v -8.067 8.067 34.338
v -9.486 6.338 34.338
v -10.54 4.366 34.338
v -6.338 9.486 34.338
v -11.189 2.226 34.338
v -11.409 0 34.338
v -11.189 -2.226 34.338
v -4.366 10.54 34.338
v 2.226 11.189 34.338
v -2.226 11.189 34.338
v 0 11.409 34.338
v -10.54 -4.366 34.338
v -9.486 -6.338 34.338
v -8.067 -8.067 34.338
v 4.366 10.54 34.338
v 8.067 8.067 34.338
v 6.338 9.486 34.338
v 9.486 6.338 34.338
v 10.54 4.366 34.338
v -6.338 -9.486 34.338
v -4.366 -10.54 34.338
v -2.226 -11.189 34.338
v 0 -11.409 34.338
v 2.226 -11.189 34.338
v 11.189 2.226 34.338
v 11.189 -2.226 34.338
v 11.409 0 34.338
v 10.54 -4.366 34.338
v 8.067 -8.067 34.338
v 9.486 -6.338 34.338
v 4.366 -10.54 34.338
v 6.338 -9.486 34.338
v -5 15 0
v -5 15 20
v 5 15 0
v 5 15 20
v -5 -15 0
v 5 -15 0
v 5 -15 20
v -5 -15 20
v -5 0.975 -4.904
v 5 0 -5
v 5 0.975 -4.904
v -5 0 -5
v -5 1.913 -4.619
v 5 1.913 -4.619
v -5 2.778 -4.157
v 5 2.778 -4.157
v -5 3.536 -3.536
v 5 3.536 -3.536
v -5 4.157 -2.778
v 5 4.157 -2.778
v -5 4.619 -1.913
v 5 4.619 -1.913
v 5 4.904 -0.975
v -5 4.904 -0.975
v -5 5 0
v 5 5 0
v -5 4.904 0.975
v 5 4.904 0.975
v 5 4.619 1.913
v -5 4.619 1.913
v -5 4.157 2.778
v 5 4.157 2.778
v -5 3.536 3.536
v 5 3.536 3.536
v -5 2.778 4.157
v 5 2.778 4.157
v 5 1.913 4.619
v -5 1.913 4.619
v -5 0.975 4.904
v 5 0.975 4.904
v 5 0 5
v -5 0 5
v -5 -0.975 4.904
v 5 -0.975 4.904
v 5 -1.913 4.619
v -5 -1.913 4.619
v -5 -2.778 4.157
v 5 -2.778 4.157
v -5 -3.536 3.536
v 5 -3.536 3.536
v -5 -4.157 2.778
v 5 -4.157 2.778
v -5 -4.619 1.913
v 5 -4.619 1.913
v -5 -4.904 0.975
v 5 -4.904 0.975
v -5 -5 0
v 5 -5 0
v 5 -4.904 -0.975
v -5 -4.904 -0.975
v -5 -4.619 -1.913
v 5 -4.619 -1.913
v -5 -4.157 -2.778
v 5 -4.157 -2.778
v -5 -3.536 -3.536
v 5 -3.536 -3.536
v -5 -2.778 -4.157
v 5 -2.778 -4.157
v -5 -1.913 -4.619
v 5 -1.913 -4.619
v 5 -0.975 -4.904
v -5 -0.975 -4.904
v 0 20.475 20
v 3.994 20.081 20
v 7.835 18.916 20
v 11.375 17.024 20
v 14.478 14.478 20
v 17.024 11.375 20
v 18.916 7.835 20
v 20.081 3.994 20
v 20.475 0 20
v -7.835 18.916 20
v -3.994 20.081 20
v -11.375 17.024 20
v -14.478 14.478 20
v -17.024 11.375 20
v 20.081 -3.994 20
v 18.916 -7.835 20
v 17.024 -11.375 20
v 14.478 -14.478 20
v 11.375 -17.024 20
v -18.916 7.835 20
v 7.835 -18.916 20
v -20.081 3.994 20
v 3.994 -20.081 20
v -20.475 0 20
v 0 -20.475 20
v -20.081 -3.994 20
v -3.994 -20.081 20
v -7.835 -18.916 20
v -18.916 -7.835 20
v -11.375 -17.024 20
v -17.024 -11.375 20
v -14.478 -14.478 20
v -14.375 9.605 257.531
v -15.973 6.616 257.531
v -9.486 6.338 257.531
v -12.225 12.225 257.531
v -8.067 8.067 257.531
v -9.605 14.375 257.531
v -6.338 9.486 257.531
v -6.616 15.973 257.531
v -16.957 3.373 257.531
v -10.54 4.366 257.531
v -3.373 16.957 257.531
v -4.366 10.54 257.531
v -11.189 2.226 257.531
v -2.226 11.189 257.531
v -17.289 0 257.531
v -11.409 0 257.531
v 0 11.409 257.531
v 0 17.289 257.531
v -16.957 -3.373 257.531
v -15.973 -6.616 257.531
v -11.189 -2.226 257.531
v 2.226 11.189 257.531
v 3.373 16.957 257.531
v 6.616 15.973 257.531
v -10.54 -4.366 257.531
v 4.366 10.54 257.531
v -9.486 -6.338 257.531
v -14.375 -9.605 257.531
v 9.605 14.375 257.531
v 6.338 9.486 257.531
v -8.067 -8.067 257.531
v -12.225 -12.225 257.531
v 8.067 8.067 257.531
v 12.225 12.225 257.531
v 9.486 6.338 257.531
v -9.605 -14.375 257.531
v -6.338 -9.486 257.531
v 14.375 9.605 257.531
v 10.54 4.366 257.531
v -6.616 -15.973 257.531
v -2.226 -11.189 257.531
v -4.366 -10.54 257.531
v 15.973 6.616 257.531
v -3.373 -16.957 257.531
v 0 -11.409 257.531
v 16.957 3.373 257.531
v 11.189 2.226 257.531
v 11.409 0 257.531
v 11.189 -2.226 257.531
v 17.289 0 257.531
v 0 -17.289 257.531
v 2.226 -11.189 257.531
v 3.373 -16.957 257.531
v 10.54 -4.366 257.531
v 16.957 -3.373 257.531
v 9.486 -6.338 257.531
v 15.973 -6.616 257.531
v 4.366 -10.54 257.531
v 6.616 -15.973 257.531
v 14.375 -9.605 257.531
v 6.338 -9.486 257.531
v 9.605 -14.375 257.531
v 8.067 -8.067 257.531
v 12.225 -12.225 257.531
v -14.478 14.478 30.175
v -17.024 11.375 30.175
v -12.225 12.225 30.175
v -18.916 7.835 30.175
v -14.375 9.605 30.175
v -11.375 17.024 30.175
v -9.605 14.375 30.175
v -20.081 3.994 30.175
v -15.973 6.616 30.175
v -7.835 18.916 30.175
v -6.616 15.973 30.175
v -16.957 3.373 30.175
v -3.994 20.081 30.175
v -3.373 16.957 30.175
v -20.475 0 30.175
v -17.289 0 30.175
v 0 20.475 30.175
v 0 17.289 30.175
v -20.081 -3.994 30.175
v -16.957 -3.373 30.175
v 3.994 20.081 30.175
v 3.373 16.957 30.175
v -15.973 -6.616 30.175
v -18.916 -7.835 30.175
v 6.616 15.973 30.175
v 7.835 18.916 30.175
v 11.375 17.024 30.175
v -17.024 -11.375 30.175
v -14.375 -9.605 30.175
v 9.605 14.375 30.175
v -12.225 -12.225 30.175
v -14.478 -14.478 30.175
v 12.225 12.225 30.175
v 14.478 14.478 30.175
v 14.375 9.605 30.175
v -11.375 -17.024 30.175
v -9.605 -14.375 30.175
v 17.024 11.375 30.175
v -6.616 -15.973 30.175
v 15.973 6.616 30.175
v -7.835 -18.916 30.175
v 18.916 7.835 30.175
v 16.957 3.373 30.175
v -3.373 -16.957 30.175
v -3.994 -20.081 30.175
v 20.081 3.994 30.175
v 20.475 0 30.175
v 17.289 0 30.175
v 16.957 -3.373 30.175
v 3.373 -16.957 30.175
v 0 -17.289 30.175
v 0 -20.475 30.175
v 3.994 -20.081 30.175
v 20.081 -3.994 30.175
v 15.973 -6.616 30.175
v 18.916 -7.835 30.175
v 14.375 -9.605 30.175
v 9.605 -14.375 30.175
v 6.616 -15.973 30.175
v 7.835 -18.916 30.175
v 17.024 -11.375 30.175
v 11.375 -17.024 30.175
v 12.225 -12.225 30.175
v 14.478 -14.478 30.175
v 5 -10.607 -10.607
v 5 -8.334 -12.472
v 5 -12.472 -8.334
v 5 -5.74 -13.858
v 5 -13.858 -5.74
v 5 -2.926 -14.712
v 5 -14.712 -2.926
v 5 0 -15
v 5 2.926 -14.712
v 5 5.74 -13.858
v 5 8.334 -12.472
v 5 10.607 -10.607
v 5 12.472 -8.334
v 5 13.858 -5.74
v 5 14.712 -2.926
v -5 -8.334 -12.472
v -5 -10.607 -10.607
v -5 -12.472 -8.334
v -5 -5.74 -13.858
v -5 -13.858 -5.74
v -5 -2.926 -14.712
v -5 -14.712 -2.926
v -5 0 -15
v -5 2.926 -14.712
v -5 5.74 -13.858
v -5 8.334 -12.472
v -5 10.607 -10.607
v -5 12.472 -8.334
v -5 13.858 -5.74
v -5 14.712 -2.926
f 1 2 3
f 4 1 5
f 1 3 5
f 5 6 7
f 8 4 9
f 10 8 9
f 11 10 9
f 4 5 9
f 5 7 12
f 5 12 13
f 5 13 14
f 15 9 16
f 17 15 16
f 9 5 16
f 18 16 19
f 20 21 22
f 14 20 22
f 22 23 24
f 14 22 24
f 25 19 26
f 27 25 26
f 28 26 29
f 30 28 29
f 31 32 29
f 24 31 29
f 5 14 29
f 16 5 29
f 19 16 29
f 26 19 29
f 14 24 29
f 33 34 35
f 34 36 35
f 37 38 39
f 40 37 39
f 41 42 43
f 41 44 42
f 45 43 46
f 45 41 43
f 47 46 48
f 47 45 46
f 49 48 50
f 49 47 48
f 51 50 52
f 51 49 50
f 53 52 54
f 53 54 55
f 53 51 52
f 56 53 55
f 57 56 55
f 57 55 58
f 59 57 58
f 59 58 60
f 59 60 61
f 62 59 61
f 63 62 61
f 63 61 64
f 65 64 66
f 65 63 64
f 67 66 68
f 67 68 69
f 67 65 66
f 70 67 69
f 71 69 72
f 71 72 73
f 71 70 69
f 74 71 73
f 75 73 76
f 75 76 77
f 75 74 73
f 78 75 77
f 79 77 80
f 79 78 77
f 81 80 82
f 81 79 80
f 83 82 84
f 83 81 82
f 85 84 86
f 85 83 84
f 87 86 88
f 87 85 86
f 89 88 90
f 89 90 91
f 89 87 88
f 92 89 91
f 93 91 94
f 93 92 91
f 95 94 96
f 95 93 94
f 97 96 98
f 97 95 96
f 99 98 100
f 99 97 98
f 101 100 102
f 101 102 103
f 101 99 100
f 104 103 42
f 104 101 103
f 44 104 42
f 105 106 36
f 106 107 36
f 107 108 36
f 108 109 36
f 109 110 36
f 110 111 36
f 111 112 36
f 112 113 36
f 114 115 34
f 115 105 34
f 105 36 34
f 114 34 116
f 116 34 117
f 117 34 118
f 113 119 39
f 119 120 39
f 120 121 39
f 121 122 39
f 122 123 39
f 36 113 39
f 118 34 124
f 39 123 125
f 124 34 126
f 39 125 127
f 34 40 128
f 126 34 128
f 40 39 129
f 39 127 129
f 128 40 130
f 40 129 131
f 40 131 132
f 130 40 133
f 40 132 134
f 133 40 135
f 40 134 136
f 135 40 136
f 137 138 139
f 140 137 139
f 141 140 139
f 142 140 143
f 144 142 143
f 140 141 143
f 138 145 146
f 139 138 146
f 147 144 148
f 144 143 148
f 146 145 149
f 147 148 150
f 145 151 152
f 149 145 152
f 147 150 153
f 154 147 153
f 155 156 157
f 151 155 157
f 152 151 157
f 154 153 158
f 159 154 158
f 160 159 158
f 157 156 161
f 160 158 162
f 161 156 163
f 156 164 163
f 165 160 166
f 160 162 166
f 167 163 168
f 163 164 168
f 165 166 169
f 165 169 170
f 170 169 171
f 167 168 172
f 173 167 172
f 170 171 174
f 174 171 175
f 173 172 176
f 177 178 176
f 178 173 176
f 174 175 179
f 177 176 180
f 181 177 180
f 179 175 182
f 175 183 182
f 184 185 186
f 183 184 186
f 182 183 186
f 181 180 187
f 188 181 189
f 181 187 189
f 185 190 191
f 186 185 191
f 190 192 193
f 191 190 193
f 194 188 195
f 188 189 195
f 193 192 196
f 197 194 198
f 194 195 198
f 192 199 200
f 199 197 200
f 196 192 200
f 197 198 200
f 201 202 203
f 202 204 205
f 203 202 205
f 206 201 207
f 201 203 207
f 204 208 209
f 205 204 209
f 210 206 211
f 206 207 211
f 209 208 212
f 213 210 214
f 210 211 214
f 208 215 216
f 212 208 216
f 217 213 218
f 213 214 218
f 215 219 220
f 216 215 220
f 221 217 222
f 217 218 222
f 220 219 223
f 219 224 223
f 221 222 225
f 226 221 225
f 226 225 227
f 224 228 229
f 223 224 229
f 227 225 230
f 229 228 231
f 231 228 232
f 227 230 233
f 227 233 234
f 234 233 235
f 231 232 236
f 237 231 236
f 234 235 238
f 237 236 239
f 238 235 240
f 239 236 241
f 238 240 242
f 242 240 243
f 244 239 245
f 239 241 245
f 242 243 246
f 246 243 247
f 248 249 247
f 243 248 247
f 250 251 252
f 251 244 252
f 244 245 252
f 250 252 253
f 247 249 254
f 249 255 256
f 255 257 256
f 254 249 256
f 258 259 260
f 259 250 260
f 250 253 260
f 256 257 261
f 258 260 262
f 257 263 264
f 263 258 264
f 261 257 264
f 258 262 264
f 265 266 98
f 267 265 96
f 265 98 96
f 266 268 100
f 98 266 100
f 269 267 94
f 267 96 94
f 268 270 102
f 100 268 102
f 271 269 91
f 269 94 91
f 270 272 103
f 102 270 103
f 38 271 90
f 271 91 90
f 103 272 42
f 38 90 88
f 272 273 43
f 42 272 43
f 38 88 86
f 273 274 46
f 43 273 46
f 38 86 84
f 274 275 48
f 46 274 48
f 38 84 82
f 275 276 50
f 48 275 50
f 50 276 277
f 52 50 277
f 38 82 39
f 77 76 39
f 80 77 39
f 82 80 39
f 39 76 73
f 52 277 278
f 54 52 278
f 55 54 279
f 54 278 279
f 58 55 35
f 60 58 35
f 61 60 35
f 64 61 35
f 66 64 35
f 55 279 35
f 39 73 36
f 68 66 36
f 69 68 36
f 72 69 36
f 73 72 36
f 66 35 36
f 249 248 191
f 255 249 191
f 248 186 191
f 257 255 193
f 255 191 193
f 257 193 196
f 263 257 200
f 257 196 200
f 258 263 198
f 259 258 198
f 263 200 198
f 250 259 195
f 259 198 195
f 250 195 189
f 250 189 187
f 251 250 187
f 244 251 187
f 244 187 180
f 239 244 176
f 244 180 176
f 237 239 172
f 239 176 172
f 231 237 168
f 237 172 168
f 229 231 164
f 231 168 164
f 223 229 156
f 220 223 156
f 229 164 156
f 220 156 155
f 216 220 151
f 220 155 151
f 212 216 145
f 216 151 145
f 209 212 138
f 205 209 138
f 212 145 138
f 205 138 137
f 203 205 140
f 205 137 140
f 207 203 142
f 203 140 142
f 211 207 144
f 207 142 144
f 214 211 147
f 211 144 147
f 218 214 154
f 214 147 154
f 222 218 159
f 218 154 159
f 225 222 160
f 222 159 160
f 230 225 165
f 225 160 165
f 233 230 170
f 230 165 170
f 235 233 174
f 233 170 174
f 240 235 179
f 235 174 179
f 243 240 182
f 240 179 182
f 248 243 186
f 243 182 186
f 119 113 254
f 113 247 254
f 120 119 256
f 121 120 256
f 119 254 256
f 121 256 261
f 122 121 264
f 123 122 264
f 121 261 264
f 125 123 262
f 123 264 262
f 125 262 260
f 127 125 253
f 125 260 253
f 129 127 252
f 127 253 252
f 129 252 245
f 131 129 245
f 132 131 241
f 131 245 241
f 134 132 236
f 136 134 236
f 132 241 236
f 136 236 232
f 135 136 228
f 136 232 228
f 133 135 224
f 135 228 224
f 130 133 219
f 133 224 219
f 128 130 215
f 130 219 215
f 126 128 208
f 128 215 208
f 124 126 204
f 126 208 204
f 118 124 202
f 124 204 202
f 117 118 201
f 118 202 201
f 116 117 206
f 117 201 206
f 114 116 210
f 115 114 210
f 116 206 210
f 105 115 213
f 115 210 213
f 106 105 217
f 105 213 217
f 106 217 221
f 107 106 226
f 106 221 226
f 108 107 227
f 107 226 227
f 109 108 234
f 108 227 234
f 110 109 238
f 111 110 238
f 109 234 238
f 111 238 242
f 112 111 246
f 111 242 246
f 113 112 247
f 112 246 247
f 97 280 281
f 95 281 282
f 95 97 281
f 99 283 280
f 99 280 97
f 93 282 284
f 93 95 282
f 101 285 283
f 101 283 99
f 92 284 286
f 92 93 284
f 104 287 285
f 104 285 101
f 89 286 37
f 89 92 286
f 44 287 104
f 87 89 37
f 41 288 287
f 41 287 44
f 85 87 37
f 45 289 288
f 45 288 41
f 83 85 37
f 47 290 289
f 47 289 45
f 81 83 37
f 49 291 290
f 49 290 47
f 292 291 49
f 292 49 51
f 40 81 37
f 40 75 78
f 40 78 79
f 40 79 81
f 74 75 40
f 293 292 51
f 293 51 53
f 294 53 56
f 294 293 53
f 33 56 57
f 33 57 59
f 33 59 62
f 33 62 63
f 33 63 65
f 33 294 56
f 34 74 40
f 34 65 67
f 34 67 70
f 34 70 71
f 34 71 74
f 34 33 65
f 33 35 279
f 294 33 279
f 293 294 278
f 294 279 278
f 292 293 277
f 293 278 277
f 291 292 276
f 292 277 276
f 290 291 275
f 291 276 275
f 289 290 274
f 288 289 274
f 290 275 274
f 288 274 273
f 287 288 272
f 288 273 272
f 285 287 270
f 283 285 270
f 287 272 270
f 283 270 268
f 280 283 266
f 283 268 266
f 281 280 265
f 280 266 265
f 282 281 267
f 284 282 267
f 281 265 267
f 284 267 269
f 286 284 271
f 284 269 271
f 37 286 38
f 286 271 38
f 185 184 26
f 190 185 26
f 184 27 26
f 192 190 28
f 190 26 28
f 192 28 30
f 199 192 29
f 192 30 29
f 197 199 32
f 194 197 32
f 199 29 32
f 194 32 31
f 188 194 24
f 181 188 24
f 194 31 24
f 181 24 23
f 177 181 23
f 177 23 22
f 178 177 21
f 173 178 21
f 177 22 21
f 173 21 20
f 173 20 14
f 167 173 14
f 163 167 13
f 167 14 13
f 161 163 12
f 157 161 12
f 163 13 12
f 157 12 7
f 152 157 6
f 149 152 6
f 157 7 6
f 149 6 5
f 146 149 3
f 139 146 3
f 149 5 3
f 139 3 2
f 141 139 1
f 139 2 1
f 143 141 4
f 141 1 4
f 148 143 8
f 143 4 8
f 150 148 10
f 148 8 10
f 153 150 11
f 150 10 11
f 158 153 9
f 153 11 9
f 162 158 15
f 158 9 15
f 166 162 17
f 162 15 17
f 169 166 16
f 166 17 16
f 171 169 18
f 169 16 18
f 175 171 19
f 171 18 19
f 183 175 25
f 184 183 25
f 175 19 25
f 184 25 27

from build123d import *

# Parameters (mm, degrees)
SKETCH1_R           = 5
BOSS_EXTRUDE1_DEPTH = 5


with BuildPart() as part:
    # Sketch1 → Boss-Extrude1 (new, symmetric)
    with BuildSketch(Plane(origin=(0, 0, 0), x_dir=(0, 0, -1), z_dir=(1, 0, 0))):
        with BuildLine():
            Line((0, -15), (-20, -15))
            Line((-20, -15), (-20, 15))
            Line((-20, 15), (0, 15))
            ThreePointArc((0, 15), (15, 0), (0, -15))
        make_face()
        Circle(SKETCH1_R, mode=Mode.SUBTRACT)
    extrude(amount=BOSS_EXTRUDE1_DEPTH, both=True)

    # Sketch2 → Revolve1 (revolve)
    with BuildSketch(Plane(origin=(0, 0, 0), x_dir=(0, 0, -1), z_dir=(1, 0, 0)), mode=Mode.PRIVATE) as revolve1_sk:
        Polygon((-20, 0), (-20, 20.474587648), (-30.174617149, 20.474587648), (-30.174617149, 17.289208906), (-257.531045689, 17.289208906), (-257.531045689, 11.408509691), (-34.338293907, 11.408509691), (-34.338293907, 0), align=None)
    revolve(revolve1_sk.sketch.rotate(Axis((0, 0, 34.338293907), (0, 0, -1)), 90), axis=Axis((0, 0, 34.338293907), (0, 0, -1)))


solid = part.part
